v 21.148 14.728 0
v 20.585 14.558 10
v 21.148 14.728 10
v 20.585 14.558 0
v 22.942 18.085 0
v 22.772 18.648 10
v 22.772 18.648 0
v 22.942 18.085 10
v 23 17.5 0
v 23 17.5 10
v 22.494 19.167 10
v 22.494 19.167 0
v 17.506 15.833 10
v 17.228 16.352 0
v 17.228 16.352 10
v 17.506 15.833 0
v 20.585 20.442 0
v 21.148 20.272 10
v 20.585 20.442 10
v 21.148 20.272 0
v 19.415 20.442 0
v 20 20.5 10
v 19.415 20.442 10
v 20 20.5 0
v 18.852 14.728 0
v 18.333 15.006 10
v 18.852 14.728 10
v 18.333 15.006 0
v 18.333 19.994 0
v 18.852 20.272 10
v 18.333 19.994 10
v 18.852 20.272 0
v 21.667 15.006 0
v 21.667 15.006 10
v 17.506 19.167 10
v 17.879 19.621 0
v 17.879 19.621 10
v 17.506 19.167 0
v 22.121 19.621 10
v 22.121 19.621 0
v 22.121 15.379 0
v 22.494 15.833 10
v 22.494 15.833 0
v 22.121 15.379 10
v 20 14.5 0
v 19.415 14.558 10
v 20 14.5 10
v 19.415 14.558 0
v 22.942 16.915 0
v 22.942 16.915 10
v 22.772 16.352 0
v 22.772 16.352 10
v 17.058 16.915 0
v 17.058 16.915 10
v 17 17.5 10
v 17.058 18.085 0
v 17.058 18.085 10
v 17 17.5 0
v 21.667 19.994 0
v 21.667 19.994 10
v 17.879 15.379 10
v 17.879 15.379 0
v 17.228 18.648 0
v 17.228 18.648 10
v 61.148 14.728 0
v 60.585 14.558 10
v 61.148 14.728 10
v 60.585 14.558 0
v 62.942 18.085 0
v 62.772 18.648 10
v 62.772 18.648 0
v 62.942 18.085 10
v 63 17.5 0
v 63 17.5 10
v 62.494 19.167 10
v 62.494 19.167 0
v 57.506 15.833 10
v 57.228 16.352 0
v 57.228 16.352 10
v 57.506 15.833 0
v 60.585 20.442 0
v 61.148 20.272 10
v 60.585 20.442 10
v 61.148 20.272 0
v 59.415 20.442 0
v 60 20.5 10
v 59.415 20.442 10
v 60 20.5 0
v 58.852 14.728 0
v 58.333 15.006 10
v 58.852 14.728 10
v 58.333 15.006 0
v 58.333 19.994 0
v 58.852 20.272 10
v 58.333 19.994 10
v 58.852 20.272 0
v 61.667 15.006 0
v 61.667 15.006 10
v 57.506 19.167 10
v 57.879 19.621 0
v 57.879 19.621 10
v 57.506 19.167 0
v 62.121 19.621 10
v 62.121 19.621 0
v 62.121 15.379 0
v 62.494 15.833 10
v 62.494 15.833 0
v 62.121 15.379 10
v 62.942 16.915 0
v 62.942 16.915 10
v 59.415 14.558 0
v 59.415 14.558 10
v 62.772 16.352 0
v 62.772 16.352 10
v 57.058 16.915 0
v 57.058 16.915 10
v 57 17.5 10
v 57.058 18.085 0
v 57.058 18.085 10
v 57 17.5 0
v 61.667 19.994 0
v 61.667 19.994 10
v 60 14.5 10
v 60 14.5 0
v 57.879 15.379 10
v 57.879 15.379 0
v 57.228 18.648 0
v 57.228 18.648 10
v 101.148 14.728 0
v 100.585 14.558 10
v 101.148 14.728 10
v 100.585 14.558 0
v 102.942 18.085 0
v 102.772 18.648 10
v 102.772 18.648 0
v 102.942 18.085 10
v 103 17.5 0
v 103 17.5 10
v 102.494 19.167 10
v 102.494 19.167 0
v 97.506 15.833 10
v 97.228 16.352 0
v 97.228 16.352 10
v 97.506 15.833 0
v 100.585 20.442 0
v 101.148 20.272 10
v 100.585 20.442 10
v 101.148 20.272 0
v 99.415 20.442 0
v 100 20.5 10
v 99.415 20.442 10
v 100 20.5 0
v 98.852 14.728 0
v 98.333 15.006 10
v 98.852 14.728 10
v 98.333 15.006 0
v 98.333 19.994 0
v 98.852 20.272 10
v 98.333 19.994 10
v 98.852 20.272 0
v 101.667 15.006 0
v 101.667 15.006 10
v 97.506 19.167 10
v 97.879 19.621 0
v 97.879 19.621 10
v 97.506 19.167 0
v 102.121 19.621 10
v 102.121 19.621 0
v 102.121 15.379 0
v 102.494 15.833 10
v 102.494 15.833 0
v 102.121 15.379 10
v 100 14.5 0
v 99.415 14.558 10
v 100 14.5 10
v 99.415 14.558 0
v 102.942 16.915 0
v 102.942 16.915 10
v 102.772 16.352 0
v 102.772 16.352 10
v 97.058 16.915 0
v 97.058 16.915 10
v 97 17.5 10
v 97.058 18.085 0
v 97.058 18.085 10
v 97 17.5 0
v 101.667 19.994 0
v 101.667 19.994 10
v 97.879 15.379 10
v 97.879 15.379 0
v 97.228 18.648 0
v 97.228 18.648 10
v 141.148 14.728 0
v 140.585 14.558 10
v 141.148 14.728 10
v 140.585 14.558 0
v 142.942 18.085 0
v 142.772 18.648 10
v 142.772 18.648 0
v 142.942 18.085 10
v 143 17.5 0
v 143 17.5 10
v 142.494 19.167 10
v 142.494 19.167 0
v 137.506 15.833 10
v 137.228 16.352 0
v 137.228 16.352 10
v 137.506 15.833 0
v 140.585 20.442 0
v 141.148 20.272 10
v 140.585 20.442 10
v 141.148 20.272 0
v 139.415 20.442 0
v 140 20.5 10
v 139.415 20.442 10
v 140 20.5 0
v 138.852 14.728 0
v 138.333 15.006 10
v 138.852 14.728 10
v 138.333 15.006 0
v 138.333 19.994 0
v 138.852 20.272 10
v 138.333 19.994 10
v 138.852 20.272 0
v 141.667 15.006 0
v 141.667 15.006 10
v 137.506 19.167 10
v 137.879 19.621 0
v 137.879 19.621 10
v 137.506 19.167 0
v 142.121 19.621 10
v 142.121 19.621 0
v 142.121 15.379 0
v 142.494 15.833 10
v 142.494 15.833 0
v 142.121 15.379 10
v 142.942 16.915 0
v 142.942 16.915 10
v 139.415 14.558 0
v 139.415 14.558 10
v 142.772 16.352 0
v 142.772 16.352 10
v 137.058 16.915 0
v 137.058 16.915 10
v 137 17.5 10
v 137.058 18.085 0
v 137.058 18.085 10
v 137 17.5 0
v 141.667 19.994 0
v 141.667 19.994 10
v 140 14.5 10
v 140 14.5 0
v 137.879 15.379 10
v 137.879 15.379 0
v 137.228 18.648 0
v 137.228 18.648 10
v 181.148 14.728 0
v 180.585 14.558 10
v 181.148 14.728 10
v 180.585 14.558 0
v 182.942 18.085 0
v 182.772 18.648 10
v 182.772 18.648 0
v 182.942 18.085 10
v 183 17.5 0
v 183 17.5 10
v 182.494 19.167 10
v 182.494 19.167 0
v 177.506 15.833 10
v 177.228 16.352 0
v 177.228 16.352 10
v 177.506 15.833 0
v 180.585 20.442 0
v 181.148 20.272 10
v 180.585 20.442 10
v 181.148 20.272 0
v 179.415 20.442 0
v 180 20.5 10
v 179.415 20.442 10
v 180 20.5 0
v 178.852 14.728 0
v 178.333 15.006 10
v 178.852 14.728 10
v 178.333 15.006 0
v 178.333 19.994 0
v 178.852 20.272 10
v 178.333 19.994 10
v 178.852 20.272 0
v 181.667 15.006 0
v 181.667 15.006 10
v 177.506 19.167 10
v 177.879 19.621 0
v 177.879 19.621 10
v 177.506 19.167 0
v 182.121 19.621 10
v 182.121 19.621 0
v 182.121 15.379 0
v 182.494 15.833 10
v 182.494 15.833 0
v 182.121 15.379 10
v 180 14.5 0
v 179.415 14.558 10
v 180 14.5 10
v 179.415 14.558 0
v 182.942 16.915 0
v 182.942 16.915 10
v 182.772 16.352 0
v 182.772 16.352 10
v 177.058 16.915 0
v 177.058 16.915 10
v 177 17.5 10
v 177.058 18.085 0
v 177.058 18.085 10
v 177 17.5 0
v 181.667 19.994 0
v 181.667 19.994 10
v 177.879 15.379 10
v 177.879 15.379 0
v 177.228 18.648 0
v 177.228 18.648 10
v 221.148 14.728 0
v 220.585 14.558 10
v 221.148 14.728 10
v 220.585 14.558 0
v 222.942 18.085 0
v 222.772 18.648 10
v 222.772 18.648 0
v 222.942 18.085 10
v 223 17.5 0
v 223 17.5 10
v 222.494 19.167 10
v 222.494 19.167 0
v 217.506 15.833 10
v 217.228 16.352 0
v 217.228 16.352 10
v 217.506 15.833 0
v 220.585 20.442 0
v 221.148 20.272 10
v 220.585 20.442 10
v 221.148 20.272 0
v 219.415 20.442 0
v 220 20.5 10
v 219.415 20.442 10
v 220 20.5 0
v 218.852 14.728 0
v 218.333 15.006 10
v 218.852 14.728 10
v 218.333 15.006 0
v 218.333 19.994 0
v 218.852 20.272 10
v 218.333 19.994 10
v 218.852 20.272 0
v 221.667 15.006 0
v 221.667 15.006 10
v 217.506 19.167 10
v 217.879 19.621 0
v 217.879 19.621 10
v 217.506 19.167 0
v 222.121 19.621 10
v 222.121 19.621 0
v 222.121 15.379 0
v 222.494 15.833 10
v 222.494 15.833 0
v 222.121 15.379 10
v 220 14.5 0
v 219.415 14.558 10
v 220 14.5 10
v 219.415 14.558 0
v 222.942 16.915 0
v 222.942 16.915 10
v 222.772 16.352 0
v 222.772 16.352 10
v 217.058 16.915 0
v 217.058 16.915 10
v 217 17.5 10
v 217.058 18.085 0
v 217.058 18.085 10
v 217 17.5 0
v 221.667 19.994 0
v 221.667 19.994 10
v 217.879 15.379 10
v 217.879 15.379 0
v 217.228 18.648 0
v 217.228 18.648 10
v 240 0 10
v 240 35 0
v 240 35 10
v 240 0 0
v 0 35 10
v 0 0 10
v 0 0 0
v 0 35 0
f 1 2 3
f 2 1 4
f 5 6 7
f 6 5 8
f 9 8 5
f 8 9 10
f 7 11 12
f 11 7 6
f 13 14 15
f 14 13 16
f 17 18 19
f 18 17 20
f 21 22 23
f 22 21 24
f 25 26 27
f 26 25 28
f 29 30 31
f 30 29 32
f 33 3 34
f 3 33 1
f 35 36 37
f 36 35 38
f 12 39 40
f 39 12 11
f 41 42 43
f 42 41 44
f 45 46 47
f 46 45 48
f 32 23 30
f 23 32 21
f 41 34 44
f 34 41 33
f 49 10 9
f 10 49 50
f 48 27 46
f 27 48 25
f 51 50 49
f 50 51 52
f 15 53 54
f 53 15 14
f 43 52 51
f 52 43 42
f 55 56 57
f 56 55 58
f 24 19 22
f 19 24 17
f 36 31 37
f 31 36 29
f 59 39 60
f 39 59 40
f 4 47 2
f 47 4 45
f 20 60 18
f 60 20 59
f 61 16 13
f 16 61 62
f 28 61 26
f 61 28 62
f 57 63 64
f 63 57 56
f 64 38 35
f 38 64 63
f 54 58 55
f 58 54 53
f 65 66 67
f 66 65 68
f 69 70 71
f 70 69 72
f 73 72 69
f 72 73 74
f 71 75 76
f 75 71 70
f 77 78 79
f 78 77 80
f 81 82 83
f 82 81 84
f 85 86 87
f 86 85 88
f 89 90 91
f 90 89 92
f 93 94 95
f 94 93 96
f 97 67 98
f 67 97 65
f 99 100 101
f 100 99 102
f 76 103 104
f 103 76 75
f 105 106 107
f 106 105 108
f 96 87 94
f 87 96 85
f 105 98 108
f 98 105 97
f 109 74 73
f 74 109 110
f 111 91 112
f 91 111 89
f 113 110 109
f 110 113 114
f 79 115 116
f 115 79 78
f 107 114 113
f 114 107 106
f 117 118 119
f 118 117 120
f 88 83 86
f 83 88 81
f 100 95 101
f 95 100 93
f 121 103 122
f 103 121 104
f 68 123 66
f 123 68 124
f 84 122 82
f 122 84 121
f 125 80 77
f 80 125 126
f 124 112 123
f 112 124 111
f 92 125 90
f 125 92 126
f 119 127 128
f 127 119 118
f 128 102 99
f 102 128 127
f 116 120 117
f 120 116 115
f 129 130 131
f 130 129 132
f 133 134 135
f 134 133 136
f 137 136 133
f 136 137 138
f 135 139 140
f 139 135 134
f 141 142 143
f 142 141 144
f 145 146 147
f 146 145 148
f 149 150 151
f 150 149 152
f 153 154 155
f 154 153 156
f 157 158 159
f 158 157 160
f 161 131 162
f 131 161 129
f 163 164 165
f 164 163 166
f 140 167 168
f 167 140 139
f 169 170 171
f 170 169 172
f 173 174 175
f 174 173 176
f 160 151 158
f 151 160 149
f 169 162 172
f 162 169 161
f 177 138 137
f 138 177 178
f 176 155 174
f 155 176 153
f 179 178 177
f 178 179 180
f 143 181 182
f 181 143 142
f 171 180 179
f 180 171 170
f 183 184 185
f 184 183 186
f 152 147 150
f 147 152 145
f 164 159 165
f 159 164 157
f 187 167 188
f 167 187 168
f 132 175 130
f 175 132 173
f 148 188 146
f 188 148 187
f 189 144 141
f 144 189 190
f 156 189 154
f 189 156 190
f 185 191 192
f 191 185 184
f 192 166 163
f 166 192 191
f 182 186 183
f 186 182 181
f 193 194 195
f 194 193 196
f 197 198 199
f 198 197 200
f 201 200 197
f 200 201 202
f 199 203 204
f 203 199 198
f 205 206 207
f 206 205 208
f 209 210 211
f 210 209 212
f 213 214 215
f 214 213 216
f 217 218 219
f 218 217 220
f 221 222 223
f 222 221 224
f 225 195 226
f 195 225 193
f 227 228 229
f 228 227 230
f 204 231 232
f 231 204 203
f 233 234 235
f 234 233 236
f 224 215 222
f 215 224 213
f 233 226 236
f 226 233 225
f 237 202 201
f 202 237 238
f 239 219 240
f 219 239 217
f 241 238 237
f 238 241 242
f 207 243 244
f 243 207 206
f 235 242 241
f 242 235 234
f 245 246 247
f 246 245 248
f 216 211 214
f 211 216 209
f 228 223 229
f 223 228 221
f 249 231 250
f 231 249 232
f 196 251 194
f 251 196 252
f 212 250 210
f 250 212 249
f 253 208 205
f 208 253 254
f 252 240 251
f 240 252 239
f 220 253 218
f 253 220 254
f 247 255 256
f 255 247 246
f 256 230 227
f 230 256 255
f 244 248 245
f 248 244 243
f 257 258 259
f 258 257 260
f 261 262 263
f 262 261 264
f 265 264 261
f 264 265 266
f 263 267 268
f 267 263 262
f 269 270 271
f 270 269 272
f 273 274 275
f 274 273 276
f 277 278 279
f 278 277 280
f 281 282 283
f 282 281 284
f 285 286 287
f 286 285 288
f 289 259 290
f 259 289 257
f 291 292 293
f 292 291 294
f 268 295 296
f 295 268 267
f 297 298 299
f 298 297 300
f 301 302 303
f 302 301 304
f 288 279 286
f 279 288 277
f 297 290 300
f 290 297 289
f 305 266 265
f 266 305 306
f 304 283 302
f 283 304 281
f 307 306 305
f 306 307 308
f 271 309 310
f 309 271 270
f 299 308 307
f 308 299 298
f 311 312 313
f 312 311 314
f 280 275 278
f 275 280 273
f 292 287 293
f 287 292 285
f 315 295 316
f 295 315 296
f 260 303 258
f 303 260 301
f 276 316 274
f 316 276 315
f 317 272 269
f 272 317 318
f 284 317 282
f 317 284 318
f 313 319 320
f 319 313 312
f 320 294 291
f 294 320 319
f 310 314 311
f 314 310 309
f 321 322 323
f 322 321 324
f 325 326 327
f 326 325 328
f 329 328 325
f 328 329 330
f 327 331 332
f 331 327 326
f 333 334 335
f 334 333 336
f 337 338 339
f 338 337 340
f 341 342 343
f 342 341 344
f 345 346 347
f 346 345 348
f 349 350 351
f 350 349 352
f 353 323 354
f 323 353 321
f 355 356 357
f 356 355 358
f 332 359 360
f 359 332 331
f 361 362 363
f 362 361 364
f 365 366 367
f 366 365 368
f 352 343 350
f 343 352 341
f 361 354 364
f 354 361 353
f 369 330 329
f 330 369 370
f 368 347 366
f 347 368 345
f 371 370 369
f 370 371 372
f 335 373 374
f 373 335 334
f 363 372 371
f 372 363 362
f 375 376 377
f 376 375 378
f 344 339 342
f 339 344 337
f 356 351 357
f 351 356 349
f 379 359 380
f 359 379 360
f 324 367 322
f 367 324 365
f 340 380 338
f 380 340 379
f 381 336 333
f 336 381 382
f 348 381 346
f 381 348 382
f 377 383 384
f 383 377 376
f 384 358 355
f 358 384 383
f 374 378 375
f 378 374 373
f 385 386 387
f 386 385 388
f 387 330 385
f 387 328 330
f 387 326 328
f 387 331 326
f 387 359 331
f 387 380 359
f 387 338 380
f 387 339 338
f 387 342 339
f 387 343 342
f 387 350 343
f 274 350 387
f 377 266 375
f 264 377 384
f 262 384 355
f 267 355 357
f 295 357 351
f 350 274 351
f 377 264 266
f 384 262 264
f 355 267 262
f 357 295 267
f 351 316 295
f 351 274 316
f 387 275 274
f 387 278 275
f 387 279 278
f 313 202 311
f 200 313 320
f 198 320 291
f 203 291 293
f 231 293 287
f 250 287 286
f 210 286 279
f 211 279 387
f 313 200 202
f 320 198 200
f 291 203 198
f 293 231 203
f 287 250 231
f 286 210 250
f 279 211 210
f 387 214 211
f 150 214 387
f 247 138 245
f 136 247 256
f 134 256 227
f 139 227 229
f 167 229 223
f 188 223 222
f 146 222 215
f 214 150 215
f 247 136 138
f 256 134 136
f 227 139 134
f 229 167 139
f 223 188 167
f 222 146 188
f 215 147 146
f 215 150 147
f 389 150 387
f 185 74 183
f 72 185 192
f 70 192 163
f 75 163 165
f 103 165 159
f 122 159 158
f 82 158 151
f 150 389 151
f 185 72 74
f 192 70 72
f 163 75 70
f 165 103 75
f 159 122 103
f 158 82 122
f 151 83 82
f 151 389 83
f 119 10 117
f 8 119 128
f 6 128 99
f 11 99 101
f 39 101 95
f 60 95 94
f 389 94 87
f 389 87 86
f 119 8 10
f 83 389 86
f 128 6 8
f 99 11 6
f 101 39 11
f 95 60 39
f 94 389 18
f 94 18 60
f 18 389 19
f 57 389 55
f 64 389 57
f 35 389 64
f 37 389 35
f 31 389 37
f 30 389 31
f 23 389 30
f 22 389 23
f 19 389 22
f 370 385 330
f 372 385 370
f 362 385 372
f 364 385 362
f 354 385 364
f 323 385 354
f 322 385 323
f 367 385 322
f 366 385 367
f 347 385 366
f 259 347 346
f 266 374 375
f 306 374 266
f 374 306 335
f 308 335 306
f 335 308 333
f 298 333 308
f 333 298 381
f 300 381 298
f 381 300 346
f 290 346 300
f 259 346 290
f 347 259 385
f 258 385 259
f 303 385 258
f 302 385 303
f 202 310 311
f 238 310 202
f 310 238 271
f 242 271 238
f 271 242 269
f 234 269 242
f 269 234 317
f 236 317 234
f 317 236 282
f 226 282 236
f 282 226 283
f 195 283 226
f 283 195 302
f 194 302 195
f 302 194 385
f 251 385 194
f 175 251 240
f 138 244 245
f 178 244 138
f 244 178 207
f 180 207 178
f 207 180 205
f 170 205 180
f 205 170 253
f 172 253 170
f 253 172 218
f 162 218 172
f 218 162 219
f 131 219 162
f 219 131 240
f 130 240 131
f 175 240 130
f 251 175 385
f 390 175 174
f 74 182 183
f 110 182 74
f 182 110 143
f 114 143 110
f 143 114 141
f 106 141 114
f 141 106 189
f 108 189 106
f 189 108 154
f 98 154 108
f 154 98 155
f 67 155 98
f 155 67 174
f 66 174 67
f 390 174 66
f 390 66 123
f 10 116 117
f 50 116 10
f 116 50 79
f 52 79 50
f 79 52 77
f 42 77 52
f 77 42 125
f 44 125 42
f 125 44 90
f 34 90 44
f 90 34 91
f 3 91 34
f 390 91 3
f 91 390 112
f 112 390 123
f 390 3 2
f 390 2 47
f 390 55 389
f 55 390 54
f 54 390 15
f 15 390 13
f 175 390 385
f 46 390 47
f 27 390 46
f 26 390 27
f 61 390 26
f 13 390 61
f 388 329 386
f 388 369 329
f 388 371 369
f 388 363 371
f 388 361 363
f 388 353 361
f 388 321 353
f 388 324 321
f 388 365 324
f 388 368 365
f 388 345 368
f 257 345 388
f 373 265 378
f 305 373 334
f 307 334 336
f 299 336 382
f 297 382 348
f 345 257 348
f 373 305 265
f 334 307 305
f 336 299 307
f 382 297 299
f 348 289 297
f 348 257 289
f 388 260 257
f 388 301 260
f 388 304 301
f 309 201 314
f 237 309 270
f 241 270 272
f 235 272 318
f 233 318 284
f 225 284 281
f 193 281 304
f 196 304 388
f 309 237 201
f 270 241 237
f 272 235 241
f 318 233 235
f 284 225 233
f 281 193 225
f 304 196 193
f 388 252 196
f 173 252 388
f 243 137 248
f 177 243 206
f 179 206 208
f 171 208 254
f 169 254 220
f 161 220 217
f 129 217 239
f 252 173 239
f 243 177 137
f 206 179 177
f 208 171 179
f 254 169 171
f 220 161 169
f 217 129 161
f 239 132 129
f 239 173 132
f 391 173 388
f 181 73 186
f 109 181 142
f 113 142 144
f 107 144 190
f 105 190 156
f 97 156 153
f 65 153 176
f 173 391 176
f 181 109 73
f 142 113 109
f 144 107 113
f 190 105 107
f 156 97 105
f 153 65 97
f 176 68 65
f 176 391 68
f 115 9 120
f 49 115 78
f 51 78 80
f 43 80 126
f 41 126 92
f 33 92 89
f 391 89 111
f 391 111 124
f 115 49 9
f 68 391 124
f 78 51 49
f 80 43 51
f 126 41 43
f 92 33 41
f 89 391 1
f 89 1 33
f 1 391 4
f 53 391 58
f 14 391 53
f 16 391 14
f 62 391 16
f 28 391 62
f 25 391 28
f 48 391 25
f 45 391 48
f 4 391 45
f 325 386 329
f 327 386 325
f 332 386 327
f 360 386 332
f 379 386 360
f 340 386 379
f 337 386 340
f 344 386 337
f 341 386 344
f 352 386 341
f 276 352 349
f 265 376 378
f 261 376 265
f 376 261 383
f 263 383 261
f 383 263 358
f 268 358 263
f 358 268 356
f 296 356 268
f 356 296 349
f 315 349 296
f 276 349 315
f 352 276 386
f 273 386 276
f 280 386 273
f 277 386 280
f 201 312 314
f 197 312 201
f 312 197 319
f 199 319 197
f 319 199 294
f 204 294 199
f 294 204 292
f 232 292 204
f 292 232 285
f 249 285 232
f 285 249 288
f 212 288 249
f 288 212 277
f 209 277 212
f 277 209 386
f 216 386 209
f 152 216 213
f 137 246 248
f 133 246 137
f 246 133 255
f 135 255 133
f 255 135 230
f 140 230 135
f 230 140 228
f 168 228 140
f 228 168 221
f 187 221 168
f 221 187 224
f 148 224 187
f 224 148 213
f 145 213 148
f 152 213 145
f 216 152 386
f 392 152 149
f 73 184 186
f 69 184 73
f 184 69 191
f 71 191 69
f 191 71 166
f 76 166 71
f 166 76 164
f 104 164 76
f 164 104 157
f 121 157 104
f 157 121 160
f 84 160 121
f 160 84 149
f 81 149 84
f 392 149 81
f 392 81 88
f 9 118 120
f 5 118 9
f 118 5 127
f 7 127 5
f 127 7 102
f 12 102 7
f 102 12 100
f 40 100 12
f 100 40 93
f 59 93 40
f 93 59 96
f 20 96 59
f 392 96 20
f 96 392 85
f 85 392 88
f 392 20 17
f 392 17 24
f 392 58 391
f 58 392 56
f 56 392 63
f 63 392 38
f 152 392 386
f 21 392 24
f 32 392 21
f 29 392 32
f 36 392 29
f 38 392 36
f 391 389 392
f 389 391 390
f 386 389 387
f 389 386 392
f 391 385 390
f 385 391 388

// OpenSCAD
$fn = 32;

// ----------------------------------------------------------------------
// Long rail: 200-250 mm mounting rail
// ----------------------------------------------------------------------

// --- parameters (mm) ---
rail_l = 240;             // rail length, X
rail_w = 35;              // rail width, Y
rail_t = 10;              // rail thickness, Z
hole_d = 6;               // mounting hole diameter
hole_start = 20;          // first hole offset from the end
hole_pitch = 40;          // hole pitch
holes = 6;                // number of holes

difference() {
  cube([rail_l, rail_w, rail_t]);
  for (i = [0 : holes - 1])
    translate([hole_start + i * hole_pitch, rail_w / 2, -1])
      cylinder(h = rail_t + 2, d = hole_d);
}
